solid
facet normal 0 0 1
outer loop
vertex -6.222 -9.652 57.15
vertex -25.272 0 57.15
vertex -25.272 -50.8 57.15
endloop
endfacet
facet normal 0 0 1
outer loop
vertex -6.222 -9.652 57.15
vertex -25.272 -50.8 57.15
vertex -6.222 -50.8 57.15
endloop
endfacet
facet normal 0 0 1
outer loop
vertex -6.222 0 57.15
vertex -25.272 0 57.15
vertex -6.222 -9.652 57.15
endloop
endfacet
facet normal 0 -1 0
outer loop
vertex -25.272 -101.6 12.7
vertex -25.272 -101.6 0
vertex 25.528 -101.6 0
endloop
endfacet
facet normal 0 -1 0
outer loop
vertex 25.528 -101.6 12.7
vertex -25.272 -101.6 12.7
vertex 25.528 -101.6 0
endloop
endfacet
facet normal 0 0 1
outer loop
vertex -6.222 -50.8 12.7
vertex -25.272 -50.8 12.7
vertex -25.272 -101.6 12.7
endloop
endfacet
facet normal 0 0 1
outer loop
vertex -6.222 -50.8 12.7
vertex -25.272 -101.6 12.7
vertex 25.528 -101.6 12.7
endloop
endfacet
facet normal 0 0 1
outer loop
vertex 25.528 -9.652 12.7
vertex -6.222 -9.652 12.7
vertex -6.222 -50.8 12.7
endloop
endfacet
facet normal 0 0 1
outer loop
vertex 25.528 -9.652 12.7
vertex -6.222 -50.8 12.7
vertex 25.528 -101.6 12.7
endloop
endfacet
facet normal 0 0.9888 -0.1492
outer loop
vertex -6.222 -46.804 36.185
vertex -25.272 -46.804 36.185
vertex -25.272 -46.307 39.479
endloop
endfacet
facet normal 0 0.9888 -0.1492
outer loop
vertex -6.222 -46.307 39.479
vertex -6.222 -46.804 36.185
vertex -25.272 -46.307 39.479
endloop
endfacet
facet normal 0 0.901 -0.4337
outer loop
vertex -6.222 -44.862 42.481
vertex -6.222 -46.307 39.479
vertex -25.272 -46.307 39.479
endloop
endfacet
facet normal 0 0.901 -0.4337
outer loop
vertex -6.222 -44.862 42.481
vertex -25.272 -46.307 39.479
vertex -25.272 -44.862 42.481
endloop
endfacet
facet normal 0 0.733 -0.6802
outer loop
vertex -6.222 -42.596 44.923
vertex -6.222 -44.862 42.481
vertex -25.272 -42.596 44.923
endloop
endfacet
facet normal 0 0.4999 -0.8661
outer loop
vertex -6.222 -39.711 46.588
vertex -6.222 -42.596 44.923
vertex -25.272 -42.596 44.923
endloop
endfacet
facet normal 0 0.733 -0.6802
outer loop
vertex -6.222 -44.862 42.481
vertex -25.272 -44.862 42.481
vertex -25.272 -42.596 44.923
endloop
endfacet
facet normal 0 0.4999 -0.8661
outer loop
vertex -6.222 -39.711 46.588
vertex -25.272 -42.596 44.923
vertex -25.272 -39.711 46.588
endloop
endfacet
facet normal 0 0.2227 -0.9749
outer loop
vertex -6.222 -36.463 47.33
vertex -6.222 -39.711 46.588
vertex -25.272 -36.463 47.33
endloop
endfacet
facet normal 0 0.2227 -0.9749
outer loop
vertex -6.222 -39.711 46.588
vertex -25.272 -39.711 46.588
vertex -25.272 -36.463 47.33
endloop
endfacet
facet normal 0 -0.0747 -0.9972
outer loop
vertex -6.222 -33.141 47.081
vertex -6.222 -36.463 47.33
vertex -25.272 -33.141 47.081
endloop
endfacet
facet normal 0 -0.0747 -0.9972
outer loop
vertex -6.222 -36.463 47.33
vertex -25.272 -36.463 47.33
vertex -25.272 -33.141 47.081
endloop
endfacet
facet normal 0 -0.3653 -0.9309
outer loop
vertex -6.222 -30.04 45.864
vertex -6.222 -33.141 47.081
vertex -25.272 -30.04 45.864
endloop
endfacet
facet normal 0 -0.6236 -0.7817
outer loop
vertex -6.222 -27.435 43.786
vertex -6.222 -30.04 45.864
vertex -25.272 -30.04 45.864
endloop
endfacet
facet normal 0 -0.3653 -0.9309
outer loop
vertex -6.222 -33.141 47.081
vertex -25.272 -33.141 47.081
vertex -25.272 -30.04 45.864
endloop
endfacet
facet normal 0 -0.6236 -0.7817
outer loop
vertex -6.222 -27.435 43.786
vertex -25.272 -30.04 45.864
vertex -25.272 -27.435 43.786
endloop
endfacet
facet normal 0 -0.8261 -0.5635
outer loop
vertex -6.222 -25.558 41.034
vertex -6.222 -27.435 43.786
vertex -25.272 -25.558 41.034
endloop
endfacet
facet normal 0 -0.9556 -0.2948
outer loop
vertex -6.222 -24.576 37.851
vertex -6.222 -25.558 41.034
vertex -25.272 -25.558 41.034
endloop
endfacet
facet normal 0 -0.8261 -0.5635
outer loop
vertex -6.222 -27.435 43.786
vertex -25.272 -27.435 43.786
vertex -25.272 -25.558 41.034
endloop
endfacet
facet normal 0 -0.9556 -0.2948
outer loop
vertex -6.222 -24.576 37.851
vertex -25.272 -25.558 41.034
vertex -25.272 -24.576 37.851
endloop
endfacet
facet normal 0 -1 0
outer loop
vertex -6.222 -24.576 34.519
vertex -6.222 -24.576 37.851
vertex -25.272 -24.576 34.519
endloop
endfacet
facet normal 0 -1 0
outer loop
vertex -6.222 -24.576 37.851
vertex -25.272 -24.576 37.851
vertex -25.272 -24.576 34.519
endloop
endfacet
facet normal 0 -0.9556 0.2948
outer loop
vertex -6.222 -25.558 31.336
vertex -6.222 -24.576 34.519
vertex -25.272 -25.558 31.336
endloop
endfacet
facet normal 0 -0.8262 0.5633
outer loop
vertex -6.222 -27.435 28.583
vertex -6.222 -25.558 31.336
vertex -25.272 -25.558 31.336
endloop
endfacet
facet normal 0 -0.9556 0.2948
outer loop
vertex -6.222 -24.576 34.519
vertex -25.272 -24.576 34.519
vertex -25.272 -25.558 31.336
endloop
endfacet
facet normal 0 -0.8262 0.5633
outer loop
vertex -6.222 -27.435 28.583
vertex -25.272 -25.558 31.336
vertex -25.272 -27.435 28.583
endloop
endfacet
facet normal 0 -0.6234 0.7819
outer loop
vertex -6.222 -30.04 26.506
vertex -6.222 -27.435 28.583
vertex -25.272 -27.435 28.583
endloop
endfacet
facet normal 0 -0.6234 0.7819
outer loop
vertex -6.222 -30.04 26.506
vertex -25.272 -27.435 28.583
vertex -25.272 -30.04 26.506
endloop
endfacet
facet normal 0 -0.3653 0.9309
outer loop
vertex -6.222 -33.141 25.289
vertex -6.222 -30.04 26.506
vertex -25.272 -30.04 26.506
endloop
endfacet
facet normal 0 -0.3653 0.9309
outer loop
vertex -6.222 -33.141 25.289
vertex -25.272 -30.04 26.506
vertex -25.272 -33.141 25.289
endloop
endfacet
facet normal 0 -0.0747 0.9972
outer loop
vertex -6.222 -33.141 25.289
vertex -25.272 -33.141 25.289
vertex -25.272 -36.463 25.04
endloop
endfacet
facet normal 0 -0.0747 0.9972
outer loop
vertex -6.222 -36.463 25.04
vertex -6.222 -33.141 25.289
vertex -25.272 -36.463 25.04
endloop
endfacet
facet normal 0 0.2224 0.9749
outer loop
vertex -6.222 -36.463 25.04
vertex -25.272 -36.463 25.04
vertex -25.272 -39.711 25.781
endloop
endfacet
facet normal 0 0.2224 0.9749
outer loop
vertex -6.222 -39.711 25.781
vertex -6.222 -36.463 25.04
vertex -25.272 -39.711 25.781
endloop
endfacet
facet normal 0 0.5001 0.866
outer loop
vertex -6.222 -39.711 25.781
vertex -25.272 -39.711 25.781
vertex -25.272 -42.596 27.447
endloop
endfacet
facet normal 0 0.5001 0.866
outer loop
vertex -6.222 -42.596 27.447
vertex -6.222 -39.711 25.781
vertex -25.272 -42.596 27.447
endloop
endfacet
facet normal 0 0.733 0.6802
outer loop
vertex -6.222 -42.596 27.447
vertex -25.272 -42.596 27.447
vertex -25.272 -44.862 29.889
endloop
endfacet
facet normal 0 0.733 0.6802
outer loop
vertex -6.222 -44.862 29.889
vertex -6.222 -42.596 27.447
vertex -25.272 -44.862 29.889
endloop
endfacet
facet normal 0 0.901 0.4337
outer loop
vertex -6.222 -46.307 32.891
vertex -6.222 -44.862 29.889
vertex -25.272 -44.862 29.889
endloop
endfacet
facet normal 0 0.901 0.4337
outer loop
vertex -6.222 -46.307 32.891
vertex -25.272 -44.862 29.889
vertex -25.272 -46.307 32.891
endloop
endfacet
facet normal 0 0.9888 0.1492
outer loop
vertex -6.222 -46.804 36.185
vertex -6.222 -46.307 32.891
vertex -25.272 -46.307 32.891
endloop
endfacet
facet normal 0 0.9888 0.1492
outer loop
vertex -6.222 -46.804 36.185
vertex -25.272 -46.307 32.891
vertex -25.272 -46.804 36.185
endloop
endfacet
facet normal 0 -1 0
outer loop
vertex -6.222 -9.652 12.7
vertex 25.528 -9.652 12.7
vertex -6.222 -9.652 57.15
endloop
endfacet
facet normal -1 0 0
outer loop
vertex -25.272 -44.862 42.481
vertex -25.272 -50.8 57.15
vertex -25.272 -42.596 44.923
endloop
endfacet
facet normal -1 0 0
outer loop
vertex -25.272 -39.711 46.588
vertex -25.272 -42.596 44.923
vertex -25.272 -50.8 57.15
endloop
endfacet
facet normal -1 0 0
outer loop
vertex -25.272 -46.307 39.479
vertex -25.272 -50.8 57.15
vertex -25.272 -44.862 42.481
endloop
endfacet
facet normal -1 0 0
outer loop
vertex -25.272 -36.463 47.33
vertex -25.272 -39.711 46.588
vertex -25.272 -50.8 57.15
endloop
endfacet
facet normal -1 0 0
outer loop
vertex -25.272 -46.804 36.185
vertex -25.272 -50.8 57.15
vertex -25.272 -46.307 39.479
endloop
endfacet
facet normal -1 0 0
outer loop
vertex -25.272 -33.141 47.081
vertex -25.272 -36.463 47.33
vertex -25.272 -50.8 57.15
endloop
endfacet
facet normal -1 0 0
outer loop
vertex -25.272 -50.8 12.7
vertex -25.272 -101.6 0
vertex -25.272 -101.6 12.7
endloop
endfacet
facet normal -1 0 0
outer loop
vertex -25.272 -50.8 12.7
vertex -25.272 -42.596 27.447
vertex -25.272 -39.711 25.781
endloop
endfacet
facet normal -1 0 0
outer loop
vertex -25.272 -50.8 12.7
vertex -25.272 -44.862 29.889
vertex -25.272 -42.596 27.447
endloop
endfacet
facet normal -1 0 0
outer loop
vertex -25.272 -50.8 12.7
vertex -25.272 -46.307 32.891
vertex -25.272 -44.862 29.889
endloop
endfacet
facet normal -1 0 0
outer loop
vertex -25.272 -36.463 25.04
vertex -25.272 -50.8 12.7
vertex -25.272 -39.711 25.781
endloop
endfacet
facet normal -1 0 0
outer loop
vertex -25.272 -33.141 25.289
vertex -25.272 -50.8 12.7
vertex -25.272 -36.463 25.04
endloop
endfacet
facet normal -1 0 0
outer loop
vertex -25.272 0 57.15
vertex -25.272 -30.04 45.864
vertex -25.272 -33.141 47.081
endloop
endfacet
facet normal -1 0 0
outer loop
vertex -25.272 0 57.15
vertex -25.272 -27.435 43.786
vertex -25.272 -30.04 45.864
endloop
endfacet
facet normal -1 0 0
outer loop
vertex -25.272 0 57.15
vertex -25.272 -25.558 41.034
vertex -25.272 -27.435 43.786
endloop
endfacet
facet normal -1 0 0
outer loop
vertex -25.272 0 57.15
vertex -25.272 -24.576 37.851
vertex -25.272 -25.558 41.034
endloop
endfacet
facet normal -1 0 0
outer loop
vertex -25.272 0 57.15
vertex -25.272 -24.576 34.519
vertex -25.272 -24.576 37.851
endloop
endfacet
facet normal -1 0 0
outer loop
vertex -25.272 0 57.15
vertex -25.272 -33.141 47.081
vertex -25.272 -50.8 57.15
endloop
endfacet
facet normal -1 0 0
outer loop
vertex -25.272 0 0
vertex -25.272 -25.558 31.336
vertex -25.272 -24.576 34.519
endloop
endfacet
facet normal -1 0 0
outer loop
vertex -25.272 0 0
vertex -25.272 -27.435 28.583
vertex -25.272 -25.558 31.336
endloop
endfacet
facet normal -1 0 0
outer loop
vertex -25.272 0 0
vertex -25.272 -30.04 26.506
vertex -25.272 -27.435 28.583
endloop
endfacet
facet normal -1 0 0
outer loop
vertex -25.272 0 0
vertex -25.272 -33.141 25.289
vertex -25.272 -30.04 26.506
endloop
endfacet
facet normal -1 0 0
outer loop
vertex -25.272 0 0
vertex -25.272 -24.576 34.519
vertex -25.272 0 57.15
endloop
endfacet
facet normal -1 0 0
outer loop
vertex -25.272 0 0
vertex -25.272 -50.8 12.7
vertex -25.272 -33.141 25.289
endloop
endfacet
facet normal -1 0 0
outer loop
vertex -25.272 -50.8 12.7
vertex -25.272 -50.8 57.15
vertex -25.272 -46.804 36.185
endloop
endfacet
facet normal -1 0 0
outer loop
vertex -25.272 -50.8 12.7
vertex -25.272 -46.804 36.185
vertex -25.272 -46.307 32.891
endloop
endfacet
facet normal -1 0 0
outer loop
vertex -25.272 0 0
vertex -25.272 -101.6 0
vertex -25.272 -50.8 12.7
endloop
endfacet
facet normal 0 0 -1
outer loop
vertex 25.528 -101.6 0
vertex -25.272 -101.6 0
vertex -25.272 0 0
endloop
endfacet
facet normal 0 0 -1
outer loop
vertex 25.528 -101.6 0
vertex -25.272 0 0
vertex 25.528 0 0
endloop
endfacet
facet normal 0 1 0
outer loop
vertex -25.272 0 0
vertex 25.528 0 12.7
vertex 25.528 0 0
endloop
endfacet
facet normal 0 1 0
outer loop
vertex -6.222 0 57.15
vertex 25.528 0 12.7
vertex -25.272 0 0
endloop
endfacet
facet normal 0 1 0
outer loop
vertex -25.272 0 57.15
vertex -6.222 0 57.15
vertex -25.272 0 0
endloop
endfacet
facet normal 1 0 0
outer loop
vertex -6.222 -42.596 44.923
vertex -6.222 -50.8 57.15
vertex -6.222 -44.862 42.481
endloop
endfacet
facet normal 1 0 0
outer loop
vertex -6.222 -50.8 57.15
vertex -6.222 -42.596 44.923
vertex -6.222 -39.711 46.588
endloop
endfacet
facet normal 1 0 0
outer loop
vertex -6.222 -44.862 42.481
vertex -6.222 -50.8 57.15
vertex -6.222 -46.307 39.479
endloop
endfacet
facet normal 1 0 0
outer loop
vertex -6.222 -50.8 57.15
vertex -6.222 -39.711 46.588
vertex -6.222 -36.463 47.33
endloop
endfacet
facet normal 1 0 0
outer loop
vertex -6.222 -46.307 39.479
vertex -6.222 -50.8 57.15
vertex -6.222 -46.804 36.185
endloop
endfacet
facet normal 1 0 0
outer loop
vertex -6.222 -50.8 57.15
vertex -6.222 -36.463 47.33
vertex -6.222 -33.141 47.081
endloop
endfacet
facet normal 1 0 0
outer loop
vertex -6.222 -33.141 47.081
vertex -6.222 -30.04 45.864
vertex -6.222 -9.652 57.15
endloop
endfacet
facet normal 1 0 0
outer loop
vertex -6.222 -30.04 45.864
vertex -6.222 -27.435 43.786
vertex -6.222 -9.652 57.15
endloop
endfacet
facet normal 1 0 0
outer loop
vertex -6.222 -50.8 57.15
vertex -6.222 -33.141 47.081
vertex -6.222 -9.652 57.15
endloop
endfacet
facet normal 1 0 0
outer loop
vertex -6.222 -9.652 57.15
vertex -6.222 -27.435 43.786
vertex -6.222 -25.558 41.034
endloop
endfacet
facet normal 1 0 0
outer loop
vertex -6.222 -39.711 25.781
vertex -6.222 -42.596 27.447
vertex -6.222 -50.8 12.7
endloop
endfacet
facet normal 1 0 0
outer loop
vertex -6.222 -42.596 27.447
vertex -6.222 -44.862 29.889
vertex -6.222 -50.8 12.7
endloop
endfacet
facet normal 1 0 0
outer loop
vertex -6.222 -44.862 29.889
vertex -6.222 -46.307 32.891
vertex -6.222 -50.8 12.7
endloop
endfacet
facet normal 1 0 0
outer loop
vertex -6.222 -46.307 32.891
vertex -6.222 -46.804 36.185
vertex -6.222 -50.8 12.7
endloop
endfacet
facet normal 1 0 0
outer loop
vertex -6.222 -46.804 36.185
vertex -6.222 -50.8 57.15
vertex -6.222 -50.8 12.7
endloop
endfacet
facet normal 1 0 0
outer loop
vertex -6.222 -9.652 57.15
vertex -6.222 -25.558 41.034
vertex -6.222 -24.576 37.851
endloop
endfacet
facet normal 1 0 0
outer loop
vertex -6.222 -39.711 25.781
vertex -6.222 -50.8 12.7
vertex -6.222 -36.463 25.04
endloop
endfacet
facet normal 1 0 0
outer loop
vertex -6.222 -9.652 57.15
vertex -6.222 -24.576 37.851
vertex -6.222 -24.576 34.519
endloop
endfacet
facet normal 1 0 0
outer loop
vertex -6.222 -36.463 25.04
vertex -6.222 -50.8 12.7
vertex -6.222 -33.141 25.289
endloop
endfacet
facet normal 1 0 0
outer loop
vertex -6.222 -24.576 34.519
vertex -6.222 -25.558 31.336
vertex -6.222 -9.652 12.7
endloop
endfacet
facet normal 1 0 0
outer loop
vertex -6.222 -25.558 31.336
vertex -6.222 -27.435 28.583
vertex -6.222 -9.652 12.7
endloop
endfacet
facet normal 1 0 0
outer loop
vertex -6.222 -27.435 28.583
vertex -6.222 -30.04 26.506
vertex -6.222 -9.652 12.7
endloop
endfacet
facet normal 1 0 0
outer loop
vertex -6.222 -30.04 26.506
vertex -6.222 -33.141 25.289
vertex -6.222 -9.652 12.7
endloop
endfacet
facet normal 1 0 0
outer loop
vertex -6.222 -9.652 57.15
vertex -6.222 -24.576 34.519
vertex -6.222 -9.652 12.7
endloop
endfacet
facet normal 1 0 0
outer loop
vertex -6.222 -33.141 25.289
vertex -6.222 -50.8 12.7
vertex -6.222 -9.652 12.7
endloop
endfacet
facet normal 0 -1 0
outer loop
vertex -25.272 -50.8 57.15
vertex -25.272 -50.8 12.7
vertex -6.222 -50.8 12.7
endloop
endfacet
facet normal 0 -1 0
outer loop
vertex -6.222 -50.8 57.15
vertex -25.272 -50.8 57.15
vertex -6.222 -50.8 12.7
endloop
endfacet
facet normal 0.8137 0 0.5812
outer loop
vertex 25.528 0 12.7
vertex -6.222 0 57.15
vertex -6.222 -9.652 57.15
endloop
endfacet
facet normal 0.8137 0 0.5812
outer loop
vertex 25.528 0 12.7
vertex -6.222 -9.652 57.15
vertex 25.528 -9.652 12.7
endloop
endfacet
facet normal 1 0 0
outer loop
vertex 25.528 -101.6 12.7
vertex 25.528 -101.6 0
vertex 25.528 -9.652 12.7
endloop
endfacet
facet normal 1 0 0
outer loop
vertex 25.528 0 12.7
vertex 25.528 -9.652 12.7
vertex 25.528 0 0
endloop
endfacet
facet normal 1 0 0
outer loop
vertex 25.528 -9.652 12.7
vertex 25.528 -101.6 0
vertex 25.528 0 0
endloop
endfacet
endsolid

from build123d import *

# Parameters (mm, degrees)
F0_W     = 50.8
F0_H     = 101.6
F1_DEPTH = 12.7
F2_W     = 19.05
F2_H     = 50.8
F3_DEPTH = 44.45
F5_DEPTH = 9.652
F7_D     = 22.352


with BuildPart() as f1:
    # F0 (on Top) → F1 (new body)
    with BuildSketch(Plane.XY):
        with Locations((0.128248, -50.8)):
            Rectangle(F0_W, F0_H)
    extrude(amount=F1_DEPTH)

    # F2 (on face) → F3 (join)
    with BuildSketch(Plane.XY.offset(12.7)):
        with Locations((-15.746752, -25.4)):
            Rectangle(F2_W, F2_H)
    extrude(amount=F3_DEPTH)

    # F4 (on face) → F5 (join)
    with BuildSketch(Plane(origin=(0, 0, 0), x_dir=(-1, 0, 0), z_dir=(0, 1, 0))):
        Polygon((6.221752, 12.7), (6.221752, 57.15), (-25.528248, 12.7), align=None)
    extrude(amount=-F5_DEPTH)

    # F7 (through all)
    with Locations(Plane.YZ.offset(-6.221752)):
        with Locations((-35.627518, 36.184873)):
            Hole(F7_D / 2)


solid = f1.part
